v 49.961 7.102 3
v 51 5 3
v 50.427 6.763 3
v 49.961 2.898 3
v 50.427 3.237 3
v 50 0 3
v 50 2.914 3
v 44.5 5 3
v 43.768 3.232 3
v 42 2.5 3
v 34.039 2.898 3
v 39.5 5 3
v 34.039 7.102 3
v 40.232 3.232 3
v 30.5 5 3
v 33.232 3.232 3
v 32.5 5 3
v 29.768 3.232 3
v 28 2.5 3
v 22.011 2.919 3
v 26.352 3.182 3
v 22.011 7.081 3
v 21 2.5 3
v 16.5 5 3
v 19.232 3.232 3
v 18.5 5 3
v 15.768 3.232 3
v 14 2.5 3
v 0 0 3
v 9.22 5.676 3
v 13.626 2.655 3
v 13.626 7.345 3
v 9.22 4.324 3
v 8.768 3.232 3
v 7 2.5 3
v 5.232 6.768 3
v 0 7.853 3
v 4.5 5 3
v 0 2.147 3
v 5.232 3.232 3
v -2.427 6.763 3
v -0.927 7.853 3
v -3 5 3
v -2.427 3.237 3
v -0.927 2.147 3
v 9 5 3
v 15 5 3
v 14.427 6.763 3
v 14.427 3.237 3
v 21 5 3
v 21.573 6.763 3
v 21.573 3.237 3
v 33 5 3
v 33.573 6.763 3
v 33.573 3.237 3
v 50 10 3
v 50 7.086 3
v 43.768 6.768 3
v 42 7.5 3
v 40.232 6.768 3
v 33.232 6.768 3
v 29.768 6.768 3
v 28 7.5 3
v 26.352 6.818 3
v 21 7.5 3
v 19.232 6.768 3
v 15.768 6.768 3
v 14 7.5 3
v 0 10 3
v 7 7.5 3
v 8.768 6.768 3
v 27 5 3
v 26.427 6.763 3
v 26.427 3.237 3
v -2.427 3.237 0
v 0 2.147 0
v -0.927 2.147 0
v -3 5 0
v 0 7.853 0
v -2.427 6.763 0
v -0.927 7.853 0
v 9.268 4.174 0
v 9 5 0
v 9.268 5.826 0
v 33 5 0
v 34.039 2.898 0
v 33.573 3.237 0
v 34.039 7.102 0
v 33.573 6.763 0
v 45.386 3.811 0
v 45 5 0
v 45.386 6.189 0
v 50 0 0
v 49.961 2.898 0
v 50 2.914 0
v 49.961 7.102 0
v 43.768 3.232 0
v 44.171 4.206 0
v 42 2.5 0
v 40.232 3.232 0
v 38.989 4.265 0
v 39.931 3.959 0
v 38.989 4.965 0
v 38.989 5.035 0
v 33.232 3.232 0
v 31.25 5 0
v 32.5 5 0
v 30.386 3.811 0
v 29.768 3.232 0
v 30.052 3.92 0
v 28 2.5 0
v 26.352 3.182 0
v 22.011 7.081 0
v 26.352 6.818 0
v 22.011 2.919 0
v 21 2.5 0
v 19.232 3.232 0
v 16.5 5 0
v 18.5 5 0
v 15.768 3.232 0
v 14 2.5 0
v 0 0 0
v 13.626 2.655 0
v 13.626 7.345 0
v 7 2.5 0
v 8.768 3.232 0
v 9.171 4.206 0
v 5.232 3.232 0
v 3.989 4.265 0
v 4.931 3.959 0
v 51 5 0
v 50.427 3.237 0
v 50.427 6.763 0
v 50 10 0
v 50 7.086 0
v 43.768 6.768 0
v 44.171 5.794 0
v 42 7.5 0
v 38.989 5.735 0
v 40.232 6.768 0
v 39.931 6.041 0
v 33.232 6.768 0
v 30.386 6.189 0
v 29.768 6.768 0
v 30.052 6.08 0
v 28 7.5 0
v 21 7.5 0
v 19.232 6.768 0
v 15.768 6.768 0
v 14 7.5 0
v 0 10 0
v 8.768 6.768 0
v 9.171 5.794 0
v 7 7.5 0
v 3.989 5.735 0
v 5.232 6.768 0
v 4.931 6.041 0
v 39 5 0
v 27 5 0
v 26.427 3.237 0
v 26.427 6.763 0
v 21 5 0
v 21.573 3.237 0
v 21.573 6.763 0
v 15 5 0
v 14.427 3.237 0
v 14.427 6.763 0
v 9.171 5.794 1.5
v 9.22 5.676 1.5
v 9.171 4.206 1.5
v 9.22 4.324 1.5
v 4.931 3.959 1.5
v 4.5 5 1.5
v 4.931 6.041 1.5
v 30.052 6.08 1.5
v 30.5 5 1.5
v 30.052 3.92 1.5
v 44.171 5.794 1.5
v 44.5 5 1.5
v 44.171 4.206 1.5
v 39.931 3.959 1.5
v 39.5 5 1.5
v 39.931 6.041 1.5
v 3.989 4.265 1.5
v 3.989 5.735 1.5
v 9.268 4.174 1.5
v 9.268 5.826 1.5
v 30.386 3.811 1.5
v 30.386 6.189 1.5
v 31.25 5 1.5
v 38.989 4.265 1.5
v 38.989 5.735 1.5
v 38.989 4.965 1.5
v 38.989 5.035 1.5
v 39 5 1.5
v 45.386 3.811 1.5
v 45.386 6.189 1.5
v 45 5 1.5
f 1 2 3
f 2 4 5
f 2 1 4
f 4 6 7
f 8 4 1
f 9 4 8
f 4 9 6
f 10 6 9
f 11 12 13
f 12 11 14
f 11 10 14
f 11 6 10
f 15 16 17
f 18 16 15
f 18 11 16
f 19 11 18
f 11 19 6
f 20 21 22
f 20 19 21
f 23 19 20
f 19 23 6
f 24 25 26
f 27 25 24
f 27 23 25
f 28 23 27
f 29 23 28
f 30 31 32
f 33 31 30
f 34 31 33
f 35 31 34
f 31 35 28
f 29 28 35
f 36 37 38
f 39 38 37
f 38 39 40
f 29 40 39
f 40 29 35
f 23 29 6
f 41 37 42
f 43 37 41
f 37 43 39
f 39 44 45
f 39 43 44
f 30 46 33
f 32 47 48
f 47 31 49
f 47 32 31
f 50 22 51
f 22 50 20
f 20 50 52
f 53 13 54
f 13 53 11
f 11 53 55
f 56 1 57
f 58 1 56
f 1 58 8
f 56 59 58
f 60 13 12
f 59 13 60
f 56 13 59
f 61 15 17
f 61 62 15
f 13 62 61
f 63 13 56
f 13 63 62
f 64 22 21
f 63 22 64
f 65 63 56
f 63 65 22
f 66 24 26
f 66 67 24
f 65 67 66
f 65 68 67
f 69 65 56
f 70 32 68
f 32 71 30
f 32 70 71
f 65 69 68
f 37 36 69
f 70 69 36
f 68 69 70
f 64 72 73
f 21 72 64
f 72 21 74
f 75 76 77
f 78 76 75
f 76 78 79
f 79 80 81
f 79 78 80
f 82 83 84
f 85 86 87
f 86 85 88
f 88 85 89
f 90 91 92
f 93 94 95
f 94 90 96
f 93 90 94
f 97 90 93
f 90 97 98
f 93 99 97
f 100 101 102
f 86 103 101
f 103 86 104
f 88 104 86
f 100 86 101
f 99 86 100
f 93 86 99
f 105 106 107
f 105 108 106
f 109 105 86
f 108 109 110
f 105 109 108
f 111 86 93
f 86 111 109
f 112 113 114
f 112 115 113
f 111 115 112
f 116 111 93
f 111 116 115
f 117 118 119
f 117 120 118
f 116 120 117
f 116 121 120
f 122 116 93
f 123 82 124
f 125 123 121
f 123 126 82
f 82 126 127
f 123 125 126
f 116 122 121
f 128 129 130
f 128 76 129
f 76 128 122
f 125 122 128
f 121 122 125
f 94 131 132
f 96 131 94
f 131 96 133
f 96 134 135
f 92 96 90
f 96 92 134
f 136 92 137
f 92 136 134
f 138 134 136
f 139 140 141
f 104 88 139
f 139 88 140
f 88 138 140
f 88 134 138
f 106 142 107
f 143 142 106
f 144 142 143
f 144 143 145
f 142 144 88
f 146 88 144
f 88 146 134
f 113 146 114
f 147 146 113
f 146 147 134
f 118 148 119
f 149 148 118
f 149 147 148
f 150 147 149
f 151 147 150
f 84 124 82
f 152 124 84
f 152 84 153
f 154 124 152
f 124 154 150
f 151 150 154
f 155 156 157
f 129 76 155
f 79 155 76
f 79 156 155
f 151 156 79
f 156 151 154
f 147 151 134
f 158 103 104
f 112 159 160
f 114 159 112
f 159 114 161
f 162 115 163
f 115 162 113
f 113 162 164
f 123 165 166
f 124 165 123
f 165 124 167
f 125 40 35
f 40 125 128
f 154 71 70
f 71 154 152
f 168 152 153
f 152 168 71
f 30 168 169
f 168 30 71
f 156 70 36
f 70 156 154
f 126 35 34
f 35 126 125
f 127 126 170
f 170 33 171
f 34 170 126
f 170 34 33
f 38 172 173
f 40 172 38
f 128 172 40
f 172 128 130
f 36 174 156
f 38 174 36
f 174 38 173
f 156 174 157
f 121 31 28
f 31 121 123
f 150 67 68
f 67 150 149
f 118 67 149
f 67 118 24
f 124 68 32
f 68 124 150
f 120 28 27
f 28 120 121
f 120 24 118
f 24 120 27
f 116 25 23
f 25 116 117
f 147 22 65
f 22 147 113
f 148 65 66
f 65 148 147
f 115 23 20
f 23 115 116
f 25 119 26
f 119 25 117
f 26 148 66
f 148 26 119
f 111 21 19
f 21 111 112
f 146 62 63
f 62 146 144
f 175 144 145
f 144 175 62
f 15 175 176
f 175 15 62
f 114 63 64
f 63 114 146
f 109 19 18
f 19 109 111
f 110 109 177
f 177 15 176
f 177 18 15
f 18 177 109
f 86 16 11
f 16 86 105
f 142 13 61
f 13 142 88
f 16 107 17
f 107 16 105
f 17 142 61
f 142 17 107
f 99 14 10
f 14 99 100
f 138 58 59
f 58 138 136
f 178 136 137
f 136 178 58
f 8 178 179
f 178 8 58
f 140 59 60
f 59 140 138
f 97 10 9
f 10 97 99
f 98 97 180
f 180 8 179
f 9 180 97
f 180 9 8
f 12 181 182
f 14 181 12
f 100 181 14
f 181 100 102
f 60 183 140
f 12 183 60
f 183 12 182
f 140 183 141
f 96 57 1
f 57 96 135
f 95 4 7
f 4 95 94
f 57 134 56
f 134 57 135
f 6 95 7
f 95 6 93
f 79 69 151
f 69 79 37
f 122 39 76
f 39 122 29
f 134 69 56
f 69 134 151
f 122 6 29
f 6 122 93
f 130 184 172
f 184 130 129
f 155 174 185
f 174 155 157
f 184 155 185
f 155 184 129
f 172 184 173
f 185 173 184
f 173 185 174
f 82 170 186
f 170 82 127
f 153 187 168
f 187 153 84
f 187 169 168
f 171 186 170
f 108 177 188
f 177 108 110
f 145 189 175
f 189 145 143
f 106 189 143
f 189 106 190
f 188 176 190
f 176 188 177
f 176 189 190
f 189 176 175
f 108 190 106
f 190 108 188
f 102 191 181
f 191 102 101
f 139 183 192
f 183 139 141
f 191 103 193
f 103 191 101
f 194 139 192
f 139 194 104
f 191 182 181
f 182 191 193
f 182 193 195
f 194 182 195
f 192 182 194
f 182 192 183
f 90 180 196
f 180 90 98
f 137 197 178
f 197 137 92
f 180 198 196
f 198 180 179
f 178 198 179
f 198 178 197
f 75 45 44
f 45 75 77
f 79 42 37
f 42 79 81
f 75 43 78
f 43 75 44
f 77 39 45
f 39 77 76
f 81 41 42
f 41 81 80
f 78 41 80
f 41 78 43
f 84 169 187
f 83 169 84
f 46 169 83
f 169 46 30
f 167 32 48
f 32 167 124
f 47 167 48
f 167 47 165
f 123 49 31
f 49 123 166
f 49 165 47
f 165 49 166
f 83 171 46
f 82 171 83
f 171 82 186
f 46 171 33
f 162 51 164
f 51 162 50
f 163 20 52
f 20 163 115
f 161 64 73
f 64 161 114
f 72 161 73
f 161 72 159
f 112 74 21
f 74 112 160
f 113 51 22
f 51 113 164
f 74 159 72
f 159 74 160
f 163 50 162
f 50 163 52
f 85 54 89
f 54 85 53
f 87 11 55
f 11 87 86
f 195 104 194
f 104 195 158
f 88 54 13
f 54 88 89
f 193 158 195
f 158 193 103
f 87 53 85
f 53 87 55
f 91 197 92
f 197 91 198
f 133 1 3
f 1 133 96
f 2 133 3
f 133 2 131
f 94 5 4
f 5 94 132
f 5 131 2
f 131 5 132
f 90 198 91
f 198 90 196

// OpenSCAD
union() {
	difference() {
		difference() {
			cube(center = false, size = [50, 10, 3]);
			union() {
				translate(v = [0, 5.0000000000, 1.5000000000]) {
					cylinder(center = true, h = 3, r = 2.5000000000);
				}
				translate(v = [7, 5.0000000000, 1.5000000000]) {
					cylinder(center = true, h = 3, r = 2.5000000000);
				}
				translate(v = [14, 5.0000000000, 1.5000000000]) {
					cylinder(center = true, h = 3, r = 2.5000000000);
				}
				translate(v = [21, 5.0000000000, 1.5000000000]) {
					cylinder(center = true, h = 3, r = 2.5000000000);
				}
				translate(v = [28, 5.0000000000, 1.5000000000]) {
					cylinder(center = true, h = 3, r = 2.5000000000);
				}
				translate(v = [35, 5.0000000000, 1.5000000000]) {
					cylinder(center = true, h = 3, r = 2.5000000000);
				}
				translate(v = [42, 5.0000000000, 1.5000000000]) {
					cylinder(center = true, h = 3, r = 2.5000000000);
				}
				translate(v = [49, 5.0000000000, 1.5000000000]) {
					cylinder(center = true, h = 3, r = 2.5000000000);
				}
			}
		}
		union() {
			translate(v = [0, 5.0000000000, 0]) {
				cylinder(center = true, h = 3, r = 1.2500000000);
			}
			translate(v = [5, 5.0000000000, 0]) {
				cylinder(center = true, h = 3, r = 1.2500000000);
			}
			translate(v = [10, 5.0000000000, 0]) {
				cylinder(center = true, h = 3, r = 1.2500000000);
			}
			translate(v = [15, 5.0000000000, 0]) {
				cylinder(center = true, h = 3, r = 1.2500000000);
			}
			translate(v = [20, 5.0000000000, 0]) {
				cylinder(center = true, h = 3, r = 1.2500000000);
			}
			translate(v = [25, 5.0000000000, 0]) {
				cylinder(center = true, h = 3, r = 1.2500000000);
			}
			translate(v = [30, 5.0000000000, 0]) {
				cylinder(center = true, h = 3, r = 1.2500000000);
			}
			translate(v = [35, 5.0000000000, 0]) {
				cylinder(center = true, h = 3, r = 1.2500000000);
			}
			translate(v = [40, 5.0000000000, 0]) {
				cylinder(center = true, h = 3, r = 1.2500000000);
			}
			translate(v = [45, 5.0000000000, 0]) {
				cylinder(center = true, h = 3, r = 1.2500000000);
			}
		}
	}
	translate(v = [25.0000000000, 5.0000000000, 1.5000000000]) {
		cube(center = true, size = [2, 10, 3]);
	}
	union() {
		translate(v = [0, 5.0000000000, 1.5000000000]) {
			cylinder(center = true, h = 3, r = 3);
		}
		translate(v = [12, 5.0000000000, 1.5000000000]) {
			cylinder(center = true, h = 3, r = 3);
		}
		translate(v = [24, 5.0000000000, 1.5000000000]) {
			cylinder(center = true, h = 3, r = 3);
		}
		translate(v = [36, 5.0000000000, 1.5000000000]) {
			cylinder(center = true, h = 3, r = 3);
		}
		translate(v = [48, 5.0000000000, 1.5000000000]) {
			cylinder(center = true, h = 3, r = 3);
		}
	}
}
